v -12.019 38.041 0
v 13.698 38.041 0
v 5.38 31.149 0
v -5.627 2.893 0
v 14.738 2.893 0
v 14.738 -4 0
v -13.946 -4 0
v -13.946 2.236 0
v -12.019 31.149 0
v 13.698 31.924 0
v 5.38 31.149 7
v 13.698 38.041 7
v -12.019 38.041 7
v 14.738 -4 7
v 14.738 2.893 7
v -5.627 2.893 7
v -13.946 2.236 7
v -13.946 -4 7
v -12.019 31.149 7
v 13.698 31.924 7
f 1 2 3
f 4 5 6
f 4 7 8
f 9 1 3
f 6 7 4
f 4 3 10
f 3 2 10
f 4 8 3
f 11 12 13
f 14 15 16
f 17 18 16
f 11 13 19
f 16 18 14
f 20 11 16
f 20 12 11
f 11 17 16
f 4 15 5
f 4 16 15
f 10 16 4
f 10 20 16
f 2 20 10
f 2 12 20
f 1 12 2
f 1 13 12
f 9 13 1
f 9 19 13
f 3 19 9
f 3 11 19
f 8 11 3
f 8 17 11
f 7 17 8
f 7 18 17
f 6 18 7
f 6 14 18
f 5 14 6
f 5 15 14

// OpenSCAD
// file: glyph.scad
// glyph — the shared geometry of every letter in the set. Defines named geometry
// only, so it renders nothing on its own; each letter part includes it and calls
// letter(). Every dimension lives in ../../lib/common.scad.
//
// A LETTER IS NOTHING BUT A LETTER. No plinth, no tongue, no tab — it is the
// bare glyph, and it attaches by standing in the deck groove and resting on the
// groove's floor. Anything else on it would be a distraction on a learning toy.
//
// It is a flat plate of one thickness, printed face-down: no overhang anywhere,
// no supports, and the face on the bed comes out smoothest.
//
// TWO TRAPS WITH text():
//
//  * A missing font FALLS BACK SILENTLY — no warning, no error, just different
//    letters. "Liberation Sans" was the first choice here because OpenSCAD
//    bundles it; on macOS the bundled faces are not registered with fontconfig,
//    so it rendered the fallback face instead and nothing said so. To check a
//    font resolved, render a string with it and with a deliberately bogus name
//    and compare bounding boxes: identical means it fell back.
//  * `size` is not the cap height in general. For Helvetica Bold they coincide
//    (size 44 -> 44.0 mm cap), which is why letter_size reads as a height.
//    Change the font and re-measure.

include <../../lib/common.scad>

// The letter's outline, upright in the XY plane, ready to be extruded along Z
// (which is the letter's thickness, and the print's build axis).
//
//   y = 0   is the deck surface
//   y < 0   is the part standing down inside the groove. It reaches letter_bury,
//           which is where the tapered groove closes to letter_t — NOT the
//           groove's floor. The letter wedges; it never bottoms out.
module glyph_2d(ch) {
    intersection() {
        translate([0, -letter_bury])
            scale([letter_condense, 1])
                text(ch, size = letter_size, font = letter_font,
                     halign = "center", valign = "baseline");
        // Trimmed flat at the baseline. Round letters (O, C, G, S) overshoot the
        // baseline by design, and a letter standing on a convex curve rocks —
        // there is nothing to stop it leaning. The trim costs nothing visible
        // and gives every letter a flat foot on the groove floor.
        translate([-200, -letter_bury]) square([400, 400]);
    }
}

// One letter, in its print orientation: lying on its face, thickness up Z.
module letter(ch) {
    linear_extrude(letter_t) glyph_2d(ch);
}

// Where that letter sits once it is dropped into a chassis, for fit checks.
module letter_fitted(ch) {
    translate([0, letter_t/2, body_top]) rotate([90, 0, 0]) letter(ch);
}
// main file
// letter Z — one part. See glyph.scad for the geometry and lib/common.scad for
// the dimensions. Prints lying on its face, exactly as exported: no supports.

include <glyph.scad>

letter("Z");
